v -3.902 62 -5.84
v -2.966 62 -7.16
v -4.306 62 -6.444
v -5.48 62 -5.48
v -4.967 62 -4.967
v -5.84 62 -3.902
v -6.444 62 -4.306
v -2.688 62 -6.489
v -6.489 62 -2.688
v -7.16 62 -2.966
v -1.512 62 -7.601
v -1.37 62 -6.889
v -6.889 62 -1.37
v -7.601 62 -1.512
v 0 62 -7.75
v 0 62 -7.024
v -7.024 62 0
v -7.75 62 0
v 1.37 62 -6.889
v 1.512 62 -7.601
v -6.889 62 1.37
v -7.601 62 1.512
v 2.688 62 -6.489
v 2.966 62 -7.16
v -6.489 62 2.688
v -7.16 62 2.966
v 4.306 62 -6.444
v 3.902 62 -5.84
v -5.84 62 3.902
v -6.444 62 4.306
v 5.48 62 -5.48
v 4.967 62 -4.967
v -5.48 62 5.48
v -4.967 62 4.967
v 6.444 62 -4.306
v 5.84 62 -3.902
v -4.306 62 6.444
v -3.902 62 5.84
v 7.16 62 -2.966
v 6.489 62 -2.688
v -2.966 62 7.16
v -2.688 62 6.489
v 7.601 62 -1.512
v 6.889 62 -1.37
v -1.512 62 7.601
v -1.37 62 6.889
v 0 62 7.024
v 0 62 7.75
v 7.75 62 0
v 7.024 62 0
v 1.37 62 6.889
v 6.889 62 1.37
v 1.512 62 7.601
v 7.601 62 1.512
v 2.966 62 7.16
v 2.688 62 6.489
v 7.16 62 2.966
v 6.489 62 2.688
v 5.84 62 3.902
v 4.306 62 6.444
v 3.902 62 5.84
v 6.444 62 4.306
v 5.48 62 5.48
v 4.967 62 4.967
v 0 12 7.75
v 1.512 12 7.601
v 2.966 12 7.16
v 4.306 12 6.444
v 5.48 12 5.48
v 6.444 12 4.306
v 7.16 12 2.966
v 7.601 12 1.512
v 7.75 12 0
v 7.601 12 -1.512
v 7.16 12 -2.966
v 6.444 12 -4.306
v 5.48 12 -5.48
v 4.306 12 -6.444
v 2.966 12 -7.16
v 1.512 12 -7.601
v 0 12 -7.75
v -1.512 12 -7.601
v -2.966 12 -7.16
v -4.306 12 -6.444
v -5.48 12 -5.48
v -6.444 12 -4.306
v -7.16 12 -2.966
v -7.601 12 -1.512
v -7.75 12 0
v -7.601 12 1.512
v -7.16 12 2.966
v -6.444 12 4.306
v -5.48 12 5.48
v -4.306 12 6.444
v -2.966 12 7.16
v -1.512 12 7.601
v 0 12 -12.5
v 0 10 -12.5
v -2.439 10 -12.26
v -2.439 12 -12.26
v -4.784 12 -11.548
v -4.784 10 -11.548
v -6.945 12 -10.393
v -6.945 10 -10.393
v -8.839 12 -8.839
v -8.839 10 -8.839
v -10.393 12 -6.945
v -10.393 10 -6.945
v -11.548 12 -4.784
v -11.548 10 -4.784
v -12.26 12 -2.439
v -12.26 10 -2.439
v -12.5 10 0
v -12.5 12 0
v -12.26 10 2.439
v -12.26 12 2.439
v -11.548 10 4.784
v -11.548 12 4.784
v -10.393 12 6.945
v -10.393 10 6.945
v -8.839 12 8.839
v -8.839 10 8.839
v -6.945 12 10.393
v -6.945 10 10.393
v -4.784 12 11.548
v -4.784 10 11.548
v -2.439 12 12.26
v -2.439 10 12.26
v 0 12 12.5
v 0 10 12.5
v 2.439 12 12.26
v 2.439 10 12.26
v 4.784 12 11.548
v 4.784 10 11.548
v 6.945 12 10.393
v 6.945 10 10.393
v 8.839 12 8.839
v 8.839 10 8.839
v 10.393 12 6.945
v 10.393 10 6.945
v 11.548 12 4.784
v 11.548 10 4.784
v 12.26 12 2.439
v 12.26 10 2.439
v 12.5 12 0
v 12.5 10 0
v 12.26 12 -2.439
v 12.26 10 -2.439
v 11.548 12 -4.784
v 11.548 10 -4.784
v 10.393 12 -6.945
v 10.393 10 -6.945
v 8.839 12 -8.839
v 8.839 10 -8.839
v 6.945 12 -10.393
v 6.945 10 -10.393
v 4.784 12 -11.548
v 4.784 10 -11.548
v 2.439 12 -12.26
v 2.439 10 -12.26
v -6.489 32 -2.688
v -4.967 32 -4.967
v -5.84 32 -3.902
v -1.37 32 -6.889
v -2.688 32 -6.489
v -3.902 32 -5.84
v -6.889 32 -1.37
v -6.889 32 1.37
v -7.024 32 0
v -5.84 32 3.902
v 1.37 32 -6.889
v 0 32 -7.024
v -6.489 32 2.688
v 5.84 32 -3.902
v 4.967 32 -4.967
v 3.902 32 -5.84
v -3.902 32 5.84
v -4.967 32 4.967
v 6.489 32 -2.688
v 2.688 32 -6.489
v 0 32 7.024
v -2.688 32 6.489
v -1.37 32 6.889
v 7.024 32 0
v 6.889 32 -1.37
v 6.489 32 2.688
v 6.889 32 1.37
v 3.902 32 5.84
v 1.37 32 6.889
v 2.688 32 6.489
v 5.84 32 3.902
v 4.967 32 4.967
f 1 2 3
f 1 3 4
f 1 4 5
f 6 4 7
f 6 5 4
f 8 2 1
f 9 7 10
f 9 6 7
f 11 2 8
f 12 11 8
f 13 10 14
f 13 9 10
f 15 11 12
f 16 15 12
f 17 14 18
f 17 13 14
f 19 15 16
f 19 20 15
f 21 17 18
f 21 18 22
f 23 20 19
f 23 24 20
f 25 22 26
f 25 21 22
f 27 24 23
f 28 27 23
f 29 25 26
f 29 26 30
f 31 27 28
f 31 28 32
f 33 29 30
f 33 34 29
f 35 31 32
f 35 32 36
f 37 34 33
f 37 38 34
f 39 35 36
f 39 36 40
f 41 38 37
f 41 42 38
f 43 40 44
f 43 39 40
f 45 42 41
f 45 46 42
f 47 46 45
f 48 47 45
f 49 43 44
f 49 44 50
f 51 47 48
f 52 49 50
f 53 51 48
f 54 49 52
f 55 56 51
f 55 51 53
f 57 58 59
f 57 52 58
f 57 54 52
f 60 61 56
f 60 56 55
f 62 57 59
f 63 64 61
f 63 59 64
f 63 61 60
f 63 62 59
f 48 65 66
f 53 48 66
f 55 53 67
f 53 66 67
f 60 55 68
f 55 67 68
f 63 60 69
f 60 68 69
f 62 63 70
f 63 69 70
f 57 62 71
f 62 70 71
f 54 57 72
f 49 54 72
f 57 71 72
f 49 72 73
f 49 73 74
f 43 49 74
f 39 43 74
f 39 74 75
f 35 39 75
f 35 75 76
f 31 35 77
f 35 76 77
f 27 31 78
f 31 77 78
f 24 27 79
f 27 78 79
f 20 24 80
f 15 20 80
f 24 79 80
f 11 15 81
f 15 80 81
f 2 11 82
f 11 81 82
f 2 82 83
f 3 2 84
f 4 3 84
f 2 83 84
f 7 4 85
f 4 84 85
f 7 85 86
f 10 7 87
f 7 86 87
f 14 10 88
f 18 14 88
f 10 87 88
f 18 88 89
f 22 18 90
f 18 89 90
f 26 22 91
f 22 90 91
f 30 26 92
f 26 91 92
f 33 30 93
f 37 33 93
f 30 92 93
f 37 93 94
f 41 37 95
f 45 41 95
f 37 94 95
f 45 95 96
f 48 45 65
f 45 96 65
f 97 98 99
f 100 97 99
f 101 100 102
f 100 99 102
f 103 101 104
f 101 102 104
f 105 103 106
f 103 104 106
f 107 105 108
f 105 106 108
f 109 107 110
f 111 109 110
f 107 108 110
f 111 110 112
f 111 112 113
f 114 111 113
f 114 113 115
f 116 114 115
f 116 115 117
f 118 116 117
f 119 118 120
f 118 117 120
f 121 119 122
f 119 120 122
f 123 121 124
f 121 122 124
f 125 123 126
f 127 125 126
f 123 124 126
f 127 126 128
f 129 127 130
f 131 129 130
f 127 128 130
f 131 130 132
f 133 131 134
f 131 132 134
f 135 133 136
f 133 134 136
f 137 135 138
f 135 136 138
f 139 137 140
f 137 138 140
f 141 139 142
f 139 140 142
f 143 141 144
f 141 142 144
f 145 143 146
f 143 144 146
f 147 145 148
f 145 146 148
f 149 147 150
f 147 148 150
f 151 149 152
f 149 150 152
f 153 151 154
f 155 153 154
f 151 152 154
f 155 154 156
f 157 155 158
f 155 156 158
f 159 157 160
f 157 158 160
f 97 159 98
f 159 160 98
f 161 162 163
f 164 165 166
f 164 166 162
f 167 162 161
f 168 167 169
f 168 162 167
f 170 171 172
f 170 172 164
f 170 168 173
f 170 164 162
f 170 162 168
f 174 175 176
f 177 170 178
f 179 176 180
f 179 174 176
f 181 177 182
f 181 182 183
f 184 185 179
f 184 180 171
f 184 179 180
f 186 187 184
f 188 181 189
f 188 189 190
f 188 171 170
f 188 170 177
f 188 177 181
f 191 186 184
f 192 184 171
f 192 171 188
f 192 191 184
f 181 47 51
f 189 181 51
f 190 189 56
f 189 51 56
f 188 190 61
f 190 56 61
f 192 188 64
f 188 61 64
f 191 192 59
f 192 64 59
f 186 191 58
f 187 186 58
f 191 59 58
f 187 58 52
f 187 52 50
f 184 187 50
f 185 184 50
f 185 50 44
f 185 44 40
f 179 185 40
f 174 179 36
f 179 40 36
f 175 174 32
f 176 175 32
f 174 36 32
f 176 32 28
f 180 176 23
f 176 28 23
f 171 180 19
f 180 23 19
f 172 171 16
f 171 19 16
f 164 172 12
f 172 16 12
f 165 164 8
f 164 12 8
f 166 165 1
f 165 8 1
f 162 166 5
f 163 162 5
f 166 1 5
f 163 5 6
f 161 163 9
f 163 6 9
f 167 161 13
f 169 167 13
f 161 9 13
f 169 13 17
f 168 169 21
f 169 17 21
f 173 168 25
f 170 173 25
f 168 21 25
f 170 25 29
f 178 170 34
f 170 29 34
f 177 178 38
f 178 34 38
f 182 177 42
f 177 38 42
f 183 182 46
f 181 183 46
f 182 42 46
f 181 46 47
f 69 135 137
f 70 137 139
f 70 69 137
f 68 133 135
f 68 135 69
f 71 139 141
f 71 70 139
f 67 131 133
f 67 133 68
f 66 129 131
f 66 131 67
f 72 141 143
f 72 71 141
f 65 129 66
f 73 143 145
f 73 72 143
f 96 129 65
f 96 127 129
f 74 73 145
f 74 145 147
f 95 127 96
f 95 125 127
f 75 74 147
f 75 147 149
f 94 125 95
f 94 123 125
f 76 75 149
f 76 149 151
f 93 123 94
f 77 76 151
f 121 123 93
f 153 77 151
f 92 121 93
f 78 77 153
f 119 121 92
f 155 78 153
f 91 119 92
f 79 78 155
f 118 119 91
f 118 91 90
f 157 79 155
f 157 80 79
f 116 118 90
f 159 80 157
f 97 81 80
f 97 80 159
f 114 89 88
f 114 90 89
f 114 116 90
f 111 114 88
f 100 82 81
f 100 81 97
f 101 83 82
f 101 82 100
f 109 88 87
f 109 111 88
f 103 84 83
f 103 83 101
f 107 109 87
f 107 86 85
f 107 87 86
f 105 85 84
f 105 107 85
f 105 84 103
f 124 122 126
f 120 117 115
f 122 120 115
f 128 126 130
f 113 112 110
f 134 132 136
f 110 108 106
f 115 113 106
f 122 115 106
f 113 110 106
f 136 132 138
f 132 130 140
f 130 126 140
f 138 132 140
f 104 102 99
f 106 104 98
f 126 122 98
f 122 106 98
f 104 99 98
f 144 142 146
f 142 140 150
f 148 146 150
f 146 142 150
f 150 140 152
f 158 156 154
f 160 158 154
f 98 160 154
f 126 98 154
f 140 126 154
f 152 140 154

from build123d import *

# Parameters (mm, degrees)
SKETCH1_W           = 101.6
SKETCH1_H           = 101.6
BOSS_EXTRUDE1_DEPTH = 10
SKETCH2_R           = 5
CUT_EXTRUDE1_DEPTH  = 5
SKETCH3_R           = 12.5
BOSS_EXTRUDE2_DEPTH = 2
SKETCH4_R           = 7.75
BOSS_EXTRUDE3_DEPTH = 50
SKETCH6_W           = 101.6
SKETCH6_H           = 101.6
CUT_EXTRUDE2_DEPTH  = 10
SKETCH7_R           = 7.023915829
CUT_EXTRUDE3_DEPTH  = 30


with BuildPart() as part:
    # Sketch1 → Boss-Extrude1 (new body)
    with BuildSketch(Plane(origin=(0, 0, 0), x_dir=(1, 0, 0), z_dir=(0, 1, 0))):
        Rectangle(SKETCH1_W, SKETCH1_H)
    extrude(amount=BOSS_EXTRUDE1_DEPTH)

    # Sketch2 → Cut-Extrude1 (cut)
    with BuildSketch(Plane(origin=(0, 0, 0), x_dir=(-1, 0, 0), z_dir=(0, -1, 0))):
        with Locations(Location((0, 0, 0), (0, 0, 90))):
            Circle(SKETCH2_R)
    extrude(amount=-CUT_EXTRUDE1_DEPTH, mode=Mode.SUBTRACT)

    # Sketch3 → Boss-Extrude2 (add)
    with BuildSketch(Plane(origin=(0, 10, 0), x_dir=(1, 0, 0), z_dir=(0, 1, 0))):
        with Locations(Location((0, 0, 0), (0, 0, 90))):
            Circle(SKETCH3_R)
    extrude(amount=BOSS_EXTRUDE2_DEPTH)

    # Sketch4 → Boss-Extrude3 (add)
    with BuildSketch(Plane(origin=(0, 12, 0), x_dir=(1, 0, 0), z_dir=(0, 1, 0))):
        with Locations(Location((0, 0, 0), (0, 0, 270))):
            Circle(SKETCH4_R)
    extrude(amount=BOSS_EXTRUDE3_DEPTH)

    # Sketch6 → Cut-Extrude2 (cut)
    with BuildSketch(Plane(origin=(0, 10, 0), x_dir=(1, 0, 0), z_dir=(0, 1, 0))):
        Rectangle(SKETCH6_W, SKETCH6_H)
    extrude(amount=-CUT_EXTRUDE2_DEPTH, mode=Mode.SUBTRACT)

    # Sketch7 → Cut-Extrude3 (cut)
    with BuildSketch(Plane(origin=(0, 62, 0), x_dir=(1, 0, 0), z_dir=(0, 1, 0))):
        with Locations(Location((0, 0, 0), (0, 0, 270))):
            Circle(SKETCH7_R)
    extrude(amount=-CUT_EXTRUDE3_DEPTH, mode=Mode.SUBTRACT)


solid = part.part
